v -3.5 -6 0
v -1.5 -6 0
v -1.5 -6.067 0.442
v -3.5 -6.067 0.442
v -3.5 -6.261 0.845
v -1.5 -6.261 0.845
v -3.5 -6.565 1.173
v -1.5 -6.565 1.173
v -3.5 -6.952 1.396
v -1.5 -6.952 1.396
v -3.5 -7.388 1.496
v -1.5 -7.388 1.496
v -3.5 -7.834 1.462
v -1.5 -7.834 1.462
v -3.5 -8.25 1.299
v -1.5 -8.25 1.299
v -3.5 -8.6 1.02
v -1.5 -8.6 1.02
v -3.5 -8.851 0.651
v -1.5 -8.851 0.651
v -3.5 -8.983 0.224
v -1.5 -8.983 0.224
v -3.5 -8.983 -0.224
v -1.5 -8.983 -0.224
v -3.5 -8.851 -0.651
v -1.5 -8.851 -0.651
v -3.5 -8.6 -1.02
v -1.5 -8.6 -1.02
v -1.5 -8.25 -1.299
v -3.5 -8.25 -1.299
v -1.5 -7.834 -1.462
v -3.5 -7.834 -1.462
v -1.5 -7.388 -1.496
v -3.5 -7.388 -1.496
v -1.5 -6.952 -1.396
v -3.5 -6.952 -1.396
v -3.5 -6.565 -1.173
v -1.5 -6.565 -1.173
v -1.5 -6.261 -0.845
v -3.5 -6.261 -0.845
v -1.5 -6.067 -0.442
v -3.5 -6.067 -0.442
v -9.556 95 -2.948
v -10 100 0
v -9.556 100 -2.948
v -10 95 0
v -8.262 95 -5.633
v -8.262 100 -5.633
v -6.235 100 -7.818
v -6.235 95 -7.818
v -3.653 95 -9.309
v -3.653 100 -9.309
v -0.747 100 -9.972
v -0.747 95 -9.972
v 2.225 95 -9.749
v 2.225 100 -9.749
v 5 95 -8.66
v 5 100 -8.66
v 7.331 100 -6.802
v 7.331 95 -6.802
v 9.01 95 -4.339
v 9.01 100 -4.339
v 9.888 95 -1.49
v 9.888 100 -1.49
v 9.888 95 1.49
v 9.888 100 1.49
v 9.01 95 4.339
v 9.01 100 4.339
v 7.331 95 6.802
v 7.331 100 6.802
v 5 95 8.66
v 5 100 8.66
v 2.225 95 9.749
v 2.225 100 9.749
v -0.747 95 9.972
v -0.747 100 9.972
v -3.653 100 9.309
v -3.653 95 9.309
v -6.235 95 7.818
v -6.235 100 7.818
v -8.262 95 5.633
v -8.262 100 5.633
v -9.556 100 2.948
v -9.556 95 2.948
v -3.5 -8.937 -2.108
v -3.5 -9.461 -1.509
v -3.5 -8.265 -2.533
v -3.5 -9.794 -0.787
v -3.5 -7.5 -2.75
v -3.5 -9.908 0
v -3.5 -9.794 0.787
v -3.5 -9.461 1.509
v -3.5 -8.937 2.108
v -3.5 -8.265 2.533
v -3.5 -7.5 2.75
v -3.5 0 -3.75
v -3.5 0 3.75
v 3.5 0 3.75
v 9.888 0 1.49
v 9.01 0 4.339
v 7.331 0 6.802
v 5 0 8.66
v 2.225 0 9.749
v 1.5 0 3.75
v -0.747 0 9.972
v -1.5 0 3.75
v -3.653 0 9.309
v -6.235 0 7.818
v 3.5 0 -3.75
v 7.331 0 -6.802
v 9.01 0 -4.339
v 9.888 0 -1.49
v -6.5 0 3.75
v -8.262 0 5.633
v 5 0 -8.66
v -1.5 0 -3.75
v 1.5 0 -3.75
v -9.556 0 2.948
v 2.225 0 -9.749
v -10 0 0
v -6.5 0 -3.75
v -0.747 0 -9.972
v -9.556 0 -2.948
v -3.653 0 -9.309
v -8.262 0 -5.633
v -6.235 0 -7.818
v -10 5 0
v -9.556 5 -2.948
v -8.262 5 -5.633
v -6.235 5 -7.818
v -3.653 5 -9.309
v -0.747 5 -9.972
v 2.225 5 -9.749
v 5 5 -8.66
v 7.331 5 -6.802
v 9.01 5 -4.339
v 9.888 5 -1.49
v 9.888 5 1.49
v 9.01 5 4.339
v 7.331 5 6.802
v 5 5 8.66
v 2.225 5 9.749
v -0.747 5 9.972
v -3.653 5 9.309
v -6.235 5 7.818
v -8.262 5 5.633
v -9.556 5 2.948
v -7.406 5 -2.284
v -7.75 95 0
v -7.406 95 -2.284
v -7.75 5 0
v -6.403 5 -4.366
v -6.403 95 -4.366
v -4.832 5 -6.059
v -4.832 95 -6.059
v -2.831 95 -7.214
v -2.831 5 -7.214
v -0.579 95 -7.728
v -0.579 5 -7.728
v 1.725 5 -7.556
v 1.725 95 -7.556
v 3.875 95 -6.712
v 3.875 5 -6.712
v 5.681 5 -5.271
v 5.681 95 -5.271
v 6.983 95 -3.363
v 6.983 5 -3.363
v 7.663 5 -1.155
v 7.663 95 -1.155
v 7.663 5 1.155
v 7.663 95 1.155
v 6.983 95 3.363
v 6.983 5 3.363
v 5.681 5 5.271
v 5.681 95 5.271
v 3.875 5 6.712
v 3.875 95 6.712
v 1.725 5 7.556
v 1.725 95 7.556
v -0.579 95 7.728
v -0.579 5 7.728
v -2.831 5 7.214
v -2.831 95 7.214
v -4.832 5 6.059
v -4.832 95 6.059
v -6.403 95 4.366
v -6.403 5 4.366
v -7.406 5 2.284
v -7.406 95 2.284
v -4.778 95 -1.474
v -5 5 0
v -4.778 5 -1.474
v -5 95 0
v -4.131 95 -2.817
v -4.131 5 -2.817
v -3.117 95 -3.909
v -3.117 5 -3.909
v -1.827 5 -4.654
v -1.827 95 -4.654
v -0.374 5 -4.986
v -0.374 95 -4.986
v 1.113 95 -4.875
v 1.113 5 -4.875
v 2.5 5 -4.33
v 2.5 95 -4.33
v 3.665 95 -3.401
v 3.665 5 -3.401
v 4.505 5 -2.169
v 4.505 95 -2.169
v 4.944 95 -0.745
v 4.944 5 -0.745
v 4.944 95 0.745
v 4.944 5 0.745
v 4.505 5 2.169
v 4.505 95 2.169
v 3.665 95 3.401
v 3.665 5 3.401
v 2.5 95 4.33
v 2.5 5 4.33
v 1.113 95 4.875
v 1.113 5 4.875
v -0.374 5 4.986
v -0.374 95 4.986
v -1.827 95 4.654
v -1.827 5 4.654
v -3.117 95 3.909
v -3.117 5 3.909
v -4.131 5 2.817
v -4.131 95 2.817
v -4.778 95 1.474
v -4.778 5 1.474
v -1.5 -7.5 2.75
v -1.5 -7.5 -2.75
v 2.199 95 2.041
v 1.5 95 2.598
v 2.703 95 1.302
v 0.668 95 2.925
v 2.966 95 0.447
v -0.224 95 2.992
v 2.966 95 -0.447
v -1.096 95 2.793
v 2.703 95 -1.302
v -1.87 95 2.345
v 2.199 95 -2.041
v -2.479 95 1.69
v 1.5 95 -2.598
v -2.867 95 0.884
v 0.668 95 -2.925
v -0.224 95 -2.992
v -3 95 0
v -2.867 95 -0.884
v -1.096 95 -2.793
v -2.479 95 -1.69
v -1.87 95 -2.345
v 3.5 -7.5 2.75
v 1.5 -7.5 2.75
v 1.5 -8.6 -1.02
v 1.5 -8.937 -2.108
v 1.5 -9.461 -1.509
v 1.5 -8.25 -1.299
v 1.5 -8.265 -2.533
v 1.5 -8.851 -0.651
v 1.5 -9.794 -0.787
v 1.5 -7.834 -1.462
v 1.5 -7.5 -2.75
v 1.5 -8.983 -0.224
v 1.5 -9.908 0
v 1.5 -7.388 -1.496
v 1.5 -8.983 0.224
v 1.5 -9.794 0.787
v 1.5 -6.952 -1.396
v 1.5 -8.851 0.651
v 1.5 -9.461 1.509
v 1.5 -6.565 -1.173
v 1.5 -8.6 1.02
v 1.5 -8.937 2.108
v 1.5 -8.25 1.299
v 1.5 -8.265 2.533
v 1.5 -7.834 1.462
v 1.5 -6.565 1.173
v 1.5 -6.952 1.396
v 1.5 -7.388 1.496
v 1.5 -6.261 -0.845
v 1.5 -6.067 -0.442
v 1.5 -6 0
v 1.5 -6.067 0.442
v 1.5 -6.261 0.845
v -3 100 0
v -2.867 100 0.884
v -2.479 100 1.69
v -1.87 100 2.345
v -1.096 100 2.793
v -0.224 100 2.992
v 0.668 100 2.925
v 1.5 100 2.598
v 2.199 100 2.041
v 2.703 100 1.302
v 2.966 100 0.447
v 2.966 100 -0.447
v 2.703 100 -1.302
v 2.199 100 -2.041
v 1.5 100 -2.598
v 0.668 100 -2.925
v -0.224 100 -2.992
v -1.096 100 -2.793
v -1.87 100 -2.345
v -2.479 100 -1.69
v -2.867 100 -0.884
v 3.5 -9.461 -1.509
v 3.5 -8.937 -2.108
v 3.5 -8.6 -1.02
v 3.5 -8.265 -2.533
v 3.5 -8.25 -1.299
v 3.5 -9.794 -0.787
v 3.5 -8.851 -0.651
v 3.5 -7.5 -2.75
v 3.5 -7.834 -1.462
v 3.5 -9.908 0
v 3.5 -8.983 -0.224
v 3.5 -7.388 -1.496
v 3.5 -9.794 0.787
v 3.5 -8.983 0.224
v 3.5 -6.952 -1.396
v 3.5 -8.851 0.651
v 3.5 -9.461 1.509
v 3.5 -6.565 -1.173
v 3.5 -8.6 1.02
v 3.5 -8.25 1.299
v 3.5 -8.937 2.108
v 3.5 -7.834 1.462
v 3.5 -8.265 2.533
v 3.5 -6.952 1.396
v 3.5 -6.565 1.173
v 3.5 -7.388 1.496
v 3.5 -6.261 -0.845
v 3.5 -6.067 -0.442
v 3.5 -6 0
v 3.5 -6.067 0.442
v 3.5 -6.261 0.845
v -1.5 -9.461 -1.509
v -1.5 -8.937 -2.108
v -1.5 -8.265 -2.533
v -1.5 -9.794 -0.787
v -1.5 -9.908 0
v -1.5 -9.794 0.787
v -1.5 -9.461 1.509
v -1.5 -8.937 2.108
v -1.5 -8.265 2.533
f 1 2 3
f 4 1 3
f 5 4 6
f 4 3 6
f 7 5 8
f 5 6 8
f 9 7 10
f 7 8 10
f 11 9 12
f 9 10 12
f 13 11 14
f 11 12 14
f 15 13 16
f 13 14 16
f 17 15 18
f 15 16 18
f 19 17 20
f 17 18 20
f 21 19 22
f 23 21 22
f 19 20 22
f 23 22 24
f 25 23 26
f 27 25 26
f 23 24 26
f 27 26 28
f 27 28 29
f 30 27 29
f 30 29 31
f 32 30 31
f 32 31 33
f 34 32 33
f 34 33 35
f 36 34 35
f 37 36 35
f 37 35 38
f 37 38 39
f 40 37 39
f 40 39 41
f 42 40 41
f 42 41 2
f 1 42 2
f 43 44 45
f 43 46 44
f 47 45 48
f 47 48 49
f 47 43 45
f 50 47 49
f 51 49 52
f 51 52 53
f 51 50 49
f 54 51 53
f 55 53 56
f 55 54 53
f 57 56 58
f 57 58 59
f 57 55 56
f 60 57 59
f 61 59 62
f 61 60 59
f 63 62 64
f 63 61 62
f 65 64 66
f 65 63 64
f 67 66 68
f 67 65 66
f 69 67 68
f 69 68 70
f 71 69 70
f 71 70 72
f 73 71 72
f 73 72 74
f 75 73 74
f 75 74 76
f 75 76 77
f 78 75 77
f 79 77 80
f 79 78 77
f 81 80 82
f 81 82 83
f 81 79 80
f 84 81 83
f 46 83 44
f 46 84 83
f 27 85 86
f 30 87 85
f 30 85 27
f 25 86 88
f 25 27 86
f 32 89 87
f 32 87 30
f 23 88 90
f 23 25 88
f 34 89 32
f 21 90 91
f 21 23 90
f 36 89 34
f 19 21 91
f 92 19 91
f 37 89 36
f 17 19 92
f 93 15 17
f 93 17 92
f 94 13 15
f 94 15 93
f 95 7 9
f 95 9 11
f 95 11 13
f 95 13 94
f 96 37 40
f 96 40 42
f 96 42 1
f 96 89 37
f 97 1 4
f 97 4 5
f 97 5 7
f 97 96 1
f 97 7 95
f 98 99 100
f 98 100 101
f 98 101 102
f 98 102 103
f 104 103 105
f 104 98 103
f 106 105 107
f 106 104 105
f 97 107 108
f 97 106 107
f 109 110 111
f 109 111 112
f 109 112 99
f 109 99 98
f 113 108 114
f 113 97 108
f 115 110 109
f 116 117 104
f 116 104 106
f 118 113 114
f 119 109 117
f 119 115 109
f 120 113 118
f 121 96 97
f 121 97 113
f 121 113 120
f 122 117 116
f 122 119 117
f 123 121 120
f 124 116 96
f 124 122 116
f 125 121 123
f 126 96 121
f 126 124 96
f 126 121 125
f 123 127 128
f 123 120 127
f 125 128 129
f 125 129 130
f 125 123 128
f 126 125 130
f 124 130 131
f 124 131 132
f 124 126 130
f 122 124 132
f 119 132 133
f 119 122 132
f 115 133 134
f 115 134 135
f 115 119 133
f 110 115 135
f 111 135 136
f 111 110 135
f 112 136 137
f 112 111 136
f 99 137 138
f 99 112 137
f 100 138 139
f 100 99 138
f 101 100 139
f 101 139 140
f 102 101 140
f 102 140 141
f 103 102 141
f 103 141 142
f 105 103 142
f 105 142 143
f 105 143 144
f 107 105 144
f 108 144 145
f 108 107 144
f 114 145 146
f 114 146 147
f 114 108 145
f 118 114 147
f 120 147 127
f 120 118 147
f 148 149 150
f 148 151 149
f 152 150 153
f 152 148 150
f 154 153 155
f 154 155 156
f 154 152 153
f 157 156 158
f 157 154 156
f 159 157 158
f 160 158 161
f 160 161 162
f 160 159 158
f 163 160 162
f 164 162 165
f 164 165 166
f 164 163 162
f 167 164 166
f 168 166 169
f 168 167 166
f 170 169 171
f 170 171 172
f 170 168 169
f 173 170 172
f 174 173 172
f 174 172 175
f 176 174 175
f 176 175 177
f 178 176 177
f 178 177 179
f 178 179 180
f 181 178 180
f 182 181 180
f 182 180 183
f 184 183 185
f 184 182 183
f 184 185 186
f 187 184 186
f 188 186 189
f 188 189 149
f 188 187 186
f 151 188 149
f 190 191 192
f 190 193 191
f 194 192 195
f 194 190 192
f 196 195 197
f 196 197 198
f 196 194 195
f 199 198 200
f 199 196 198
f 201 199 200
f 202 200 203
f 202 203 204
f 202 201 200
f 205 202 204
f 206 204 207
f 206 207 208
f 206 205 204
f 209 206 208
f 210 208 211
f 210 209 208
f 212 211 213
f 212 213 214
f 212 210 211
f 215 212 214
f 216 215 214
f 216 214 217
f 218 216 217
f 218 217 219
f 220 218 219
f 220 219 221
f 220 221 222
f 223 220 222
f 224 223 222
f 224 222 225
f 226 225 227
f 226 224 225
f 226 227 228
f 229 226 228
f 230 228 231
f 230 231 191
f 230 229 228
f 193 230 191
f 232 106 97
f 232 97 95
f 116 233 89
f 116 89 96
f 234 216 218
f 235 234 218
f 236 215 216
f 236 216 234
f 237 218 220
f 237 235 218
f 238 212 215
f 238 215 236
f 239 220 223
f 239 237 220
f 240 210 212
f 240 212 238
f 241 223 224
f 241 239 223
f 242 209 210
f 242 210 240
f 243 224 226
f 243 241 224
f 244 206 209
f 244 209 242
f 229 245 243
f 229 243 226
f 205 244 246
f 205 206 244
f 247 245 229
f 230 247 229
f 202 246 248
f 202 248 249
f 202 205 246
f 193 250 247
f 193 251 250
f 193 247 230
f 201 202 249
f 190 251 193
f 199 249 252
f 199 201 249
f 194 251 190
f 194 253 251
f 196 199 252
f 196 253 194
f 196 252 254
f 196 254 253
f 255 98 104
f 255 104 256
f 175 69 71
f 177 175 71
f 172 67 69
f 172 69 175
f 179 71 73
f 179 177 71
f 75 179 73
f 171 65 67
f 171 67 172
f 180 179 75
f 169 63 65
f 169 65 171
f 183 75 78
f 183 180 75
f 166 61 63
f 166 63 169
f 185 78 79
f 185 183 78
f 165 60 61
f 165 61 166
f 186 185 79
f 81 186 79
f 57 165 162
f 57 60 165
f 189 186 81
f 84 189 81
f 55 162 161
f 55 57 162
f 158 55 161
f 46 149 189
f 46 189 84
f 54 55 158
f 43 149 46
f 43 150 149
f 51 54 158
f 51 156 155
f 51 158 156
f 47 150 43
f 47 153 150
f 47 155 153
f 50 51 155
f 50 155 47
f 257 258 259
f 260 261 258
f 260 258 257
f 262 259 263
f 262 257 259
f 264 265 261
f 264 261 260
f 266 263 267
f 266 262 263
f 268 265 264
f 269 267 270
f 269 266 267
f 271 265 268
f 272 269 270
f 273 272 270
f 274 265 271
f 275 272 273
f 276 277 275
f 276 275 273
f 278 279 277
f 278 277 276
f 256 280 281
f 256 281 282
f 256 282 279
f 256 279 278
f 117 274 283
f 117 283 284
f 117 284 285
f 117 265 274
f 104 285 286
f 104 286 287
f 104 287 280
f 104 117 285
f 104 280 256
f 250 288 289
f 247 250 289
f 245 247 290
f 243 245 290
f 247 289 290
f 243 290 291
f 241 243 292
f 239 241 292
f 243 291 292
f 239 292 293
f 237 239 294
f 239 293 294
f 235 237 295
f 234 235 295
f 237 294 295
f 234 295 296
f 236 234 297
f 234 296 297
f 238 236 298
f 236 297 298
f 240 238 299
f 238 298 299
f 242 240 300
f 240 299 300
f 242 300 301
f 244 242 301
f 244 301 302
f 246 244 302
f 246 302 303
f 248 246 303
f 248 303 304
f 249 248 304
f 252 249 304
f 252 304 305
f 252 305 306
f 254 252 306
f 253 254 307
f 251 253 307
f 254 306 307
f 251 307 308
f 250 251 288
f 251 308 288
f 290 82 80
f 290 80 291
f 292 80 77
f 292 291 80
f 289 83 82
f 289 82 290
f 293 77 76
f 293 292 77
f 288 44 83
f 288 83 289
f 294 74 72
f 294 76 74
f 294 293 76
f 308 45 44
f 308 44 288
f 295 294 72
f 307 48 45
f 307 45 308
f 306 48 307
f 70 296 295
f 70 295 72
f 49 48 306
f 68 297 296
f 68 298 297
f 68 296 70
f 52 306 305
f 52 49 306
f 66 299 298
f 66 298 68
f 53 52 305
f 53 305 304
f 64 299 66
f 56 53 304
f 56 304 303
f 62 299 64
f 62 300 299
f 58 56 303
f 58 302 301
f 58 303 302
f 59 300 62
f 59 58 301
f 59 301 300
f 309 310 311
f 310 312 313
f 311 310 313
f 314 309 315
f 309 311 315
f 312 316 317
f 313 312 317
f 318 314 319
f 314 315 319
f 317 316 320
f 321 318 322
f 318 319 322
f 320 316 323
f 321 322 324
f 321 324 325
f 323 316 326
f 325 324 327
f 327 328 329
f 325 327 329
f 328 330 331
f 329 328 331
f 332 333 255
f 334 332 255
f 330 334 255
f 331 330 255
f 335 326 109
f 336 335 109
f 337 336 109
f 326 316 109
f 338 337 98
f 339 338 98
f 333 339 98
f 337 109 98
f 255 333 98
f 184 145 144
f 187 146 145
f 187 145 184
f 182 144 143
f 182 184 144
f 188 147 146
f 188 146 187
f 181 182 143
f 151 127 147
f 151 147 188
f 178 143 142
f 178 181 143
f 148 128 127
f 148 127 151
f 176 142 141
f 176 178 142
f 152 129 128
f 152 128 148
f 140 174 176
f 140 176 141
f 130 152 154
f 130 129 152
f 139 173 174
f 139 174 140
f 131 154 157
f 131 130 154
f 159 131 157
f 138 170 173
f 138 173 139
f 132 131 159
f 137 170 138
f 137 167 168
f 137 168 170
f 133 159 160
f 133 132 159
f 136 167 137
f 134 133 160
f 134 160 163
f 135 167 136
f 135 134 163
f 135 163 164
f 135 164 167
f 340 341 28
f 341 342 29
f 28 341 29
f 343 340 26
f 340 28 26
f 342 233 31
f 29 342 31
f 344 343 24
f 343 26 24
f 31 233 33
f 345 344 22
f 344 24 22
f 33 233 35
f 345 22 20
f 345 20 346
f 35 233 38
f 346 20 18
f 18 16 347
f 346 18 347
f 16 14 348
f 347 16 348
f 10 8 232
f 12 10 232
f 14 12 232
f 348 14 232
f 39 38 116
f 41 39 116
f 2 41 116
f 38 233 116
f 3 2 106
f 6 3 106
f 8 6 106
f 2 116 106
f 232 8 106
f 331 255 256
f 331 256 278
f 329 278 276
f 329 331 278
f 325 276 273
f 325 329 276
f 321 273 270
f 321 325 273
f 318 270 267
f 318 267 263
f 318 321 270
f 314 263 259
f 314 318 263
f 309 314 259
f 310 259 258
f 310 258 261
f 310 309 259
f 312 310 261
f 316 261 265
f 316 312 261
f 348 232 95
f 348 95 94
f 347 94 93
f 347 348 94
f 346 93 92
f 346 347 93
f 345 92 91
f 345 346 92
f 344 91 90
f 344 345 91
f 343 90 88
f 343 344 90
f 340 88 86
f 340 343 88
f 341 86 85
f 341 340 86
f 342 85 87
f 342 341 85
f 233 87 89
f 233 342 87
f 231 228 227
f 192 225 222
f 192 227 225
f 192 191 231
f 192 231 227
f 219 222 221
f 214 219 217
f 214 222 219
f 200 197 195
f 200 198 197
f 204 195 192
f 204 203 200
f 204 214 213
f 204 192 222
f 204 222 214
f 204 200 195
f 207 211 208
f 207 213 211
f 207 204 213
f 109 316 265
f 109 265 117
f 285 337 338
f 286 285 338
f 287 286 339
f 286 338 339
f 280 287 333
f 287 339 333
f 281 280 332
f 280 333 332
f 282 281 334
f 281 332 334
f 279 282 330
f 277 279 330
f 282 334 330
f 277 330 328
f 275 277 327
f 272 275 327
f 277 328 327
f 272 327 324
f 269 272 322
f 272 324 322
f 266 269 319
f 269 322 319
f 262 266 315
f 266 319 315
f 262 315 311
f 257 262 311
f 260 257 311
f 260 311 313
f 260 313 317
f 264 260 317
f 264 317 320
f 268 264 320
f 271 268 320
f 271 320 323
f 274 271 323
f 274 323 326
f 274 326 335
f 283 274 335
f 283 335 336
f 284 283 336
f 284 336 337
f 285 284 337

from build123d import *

# Parameters (mm, degrees)
SKETCH3_R           = 3
CUT_EXTRUDE1_DEPTH  = 5
SKETCH4_W           = 2
SKETCH4_H           = 7.5
BOSS_EXTRUDE2_DEPTH = 10
SKETCH6_R           = 1.5
CUT_EXTRUDE2_DEPTH  = 10


with BuildPart() as part:
    # Sketch1 → Revolve2 (revolve)
    with BuildSketch(Plane.XY, mode=Mode.PRIVATE) as revolve2_sk:
        Polygon((0, 100), (10, 100), (10, 95), (7.75, 95), (7.75, 5), (10, 5), (10, 0), (0, 0), (0, 5), (5, 5), (5, 95), (0, 95), align=None)
    revolve(revolve2_sk.sketch.rotate(Axis((0, 100, 0), (0, -1, 0)), 180), axis=Axis((0, 100, 0), (0, -1, 0)))

    # Sketch3 → Cut-Extrude1 (cut)
    with BuildSketch(Plane(origin=(0, 100, 0), x_dir=(1, 0, 0), z_dir=(0, 1, 0))):
        with Locations(Location((0, 0, 0), (0, 0, 180))):
            Circle(SKETCH3_R)
    extrude(amount=-CUT_EXTRUDE1_DEPTH, mode=Mode.SUBTRACT)

    # Sketch4 → Boss-Extrude2 (add)
    with BuildSketch(Plane.XZ):
        with Locations((-2.5, 0)):
            Rectangle(SKETCH4_W, SKETCH4_H)
        with Locations((2.5, 0)):
            Rectangle(SKETCH4_W, SKETCH4_H)
    extrude(amount=BOSS_EXTRUDE2_DEPTH)

    # Sketch6 → Cut-Extrude2 (cut)
    with BuildSketch(Plane(origin=(3.5, 0, 0), x_dir=(0, 0, -1), z_dir=(1, 0, 0))):
        with Locations(Location((0, -7.5, 0), (0, 0, 90))):
            Circle(SKETCH6_R)
        with BuildLine():
            Line((-3.75, 0), (-2.75, -7.5))
            ThreePointArc((-2.75, -7.5), (0, -9.907670091), (2.75, -7.5))
            Line((2.75, -7.5), (3.75, 0))
            Line((3.75, 0), (3.75, -10))
            Line((3.75, -10), (-3.75, -10))
            Line((-3.75, -10), (-3.75, 0))
        make_face()
    extrude(amount=-CUT_EXTRUDE2_DEPTH, mode=Mode.SUBTRACT)


solid = part.part
